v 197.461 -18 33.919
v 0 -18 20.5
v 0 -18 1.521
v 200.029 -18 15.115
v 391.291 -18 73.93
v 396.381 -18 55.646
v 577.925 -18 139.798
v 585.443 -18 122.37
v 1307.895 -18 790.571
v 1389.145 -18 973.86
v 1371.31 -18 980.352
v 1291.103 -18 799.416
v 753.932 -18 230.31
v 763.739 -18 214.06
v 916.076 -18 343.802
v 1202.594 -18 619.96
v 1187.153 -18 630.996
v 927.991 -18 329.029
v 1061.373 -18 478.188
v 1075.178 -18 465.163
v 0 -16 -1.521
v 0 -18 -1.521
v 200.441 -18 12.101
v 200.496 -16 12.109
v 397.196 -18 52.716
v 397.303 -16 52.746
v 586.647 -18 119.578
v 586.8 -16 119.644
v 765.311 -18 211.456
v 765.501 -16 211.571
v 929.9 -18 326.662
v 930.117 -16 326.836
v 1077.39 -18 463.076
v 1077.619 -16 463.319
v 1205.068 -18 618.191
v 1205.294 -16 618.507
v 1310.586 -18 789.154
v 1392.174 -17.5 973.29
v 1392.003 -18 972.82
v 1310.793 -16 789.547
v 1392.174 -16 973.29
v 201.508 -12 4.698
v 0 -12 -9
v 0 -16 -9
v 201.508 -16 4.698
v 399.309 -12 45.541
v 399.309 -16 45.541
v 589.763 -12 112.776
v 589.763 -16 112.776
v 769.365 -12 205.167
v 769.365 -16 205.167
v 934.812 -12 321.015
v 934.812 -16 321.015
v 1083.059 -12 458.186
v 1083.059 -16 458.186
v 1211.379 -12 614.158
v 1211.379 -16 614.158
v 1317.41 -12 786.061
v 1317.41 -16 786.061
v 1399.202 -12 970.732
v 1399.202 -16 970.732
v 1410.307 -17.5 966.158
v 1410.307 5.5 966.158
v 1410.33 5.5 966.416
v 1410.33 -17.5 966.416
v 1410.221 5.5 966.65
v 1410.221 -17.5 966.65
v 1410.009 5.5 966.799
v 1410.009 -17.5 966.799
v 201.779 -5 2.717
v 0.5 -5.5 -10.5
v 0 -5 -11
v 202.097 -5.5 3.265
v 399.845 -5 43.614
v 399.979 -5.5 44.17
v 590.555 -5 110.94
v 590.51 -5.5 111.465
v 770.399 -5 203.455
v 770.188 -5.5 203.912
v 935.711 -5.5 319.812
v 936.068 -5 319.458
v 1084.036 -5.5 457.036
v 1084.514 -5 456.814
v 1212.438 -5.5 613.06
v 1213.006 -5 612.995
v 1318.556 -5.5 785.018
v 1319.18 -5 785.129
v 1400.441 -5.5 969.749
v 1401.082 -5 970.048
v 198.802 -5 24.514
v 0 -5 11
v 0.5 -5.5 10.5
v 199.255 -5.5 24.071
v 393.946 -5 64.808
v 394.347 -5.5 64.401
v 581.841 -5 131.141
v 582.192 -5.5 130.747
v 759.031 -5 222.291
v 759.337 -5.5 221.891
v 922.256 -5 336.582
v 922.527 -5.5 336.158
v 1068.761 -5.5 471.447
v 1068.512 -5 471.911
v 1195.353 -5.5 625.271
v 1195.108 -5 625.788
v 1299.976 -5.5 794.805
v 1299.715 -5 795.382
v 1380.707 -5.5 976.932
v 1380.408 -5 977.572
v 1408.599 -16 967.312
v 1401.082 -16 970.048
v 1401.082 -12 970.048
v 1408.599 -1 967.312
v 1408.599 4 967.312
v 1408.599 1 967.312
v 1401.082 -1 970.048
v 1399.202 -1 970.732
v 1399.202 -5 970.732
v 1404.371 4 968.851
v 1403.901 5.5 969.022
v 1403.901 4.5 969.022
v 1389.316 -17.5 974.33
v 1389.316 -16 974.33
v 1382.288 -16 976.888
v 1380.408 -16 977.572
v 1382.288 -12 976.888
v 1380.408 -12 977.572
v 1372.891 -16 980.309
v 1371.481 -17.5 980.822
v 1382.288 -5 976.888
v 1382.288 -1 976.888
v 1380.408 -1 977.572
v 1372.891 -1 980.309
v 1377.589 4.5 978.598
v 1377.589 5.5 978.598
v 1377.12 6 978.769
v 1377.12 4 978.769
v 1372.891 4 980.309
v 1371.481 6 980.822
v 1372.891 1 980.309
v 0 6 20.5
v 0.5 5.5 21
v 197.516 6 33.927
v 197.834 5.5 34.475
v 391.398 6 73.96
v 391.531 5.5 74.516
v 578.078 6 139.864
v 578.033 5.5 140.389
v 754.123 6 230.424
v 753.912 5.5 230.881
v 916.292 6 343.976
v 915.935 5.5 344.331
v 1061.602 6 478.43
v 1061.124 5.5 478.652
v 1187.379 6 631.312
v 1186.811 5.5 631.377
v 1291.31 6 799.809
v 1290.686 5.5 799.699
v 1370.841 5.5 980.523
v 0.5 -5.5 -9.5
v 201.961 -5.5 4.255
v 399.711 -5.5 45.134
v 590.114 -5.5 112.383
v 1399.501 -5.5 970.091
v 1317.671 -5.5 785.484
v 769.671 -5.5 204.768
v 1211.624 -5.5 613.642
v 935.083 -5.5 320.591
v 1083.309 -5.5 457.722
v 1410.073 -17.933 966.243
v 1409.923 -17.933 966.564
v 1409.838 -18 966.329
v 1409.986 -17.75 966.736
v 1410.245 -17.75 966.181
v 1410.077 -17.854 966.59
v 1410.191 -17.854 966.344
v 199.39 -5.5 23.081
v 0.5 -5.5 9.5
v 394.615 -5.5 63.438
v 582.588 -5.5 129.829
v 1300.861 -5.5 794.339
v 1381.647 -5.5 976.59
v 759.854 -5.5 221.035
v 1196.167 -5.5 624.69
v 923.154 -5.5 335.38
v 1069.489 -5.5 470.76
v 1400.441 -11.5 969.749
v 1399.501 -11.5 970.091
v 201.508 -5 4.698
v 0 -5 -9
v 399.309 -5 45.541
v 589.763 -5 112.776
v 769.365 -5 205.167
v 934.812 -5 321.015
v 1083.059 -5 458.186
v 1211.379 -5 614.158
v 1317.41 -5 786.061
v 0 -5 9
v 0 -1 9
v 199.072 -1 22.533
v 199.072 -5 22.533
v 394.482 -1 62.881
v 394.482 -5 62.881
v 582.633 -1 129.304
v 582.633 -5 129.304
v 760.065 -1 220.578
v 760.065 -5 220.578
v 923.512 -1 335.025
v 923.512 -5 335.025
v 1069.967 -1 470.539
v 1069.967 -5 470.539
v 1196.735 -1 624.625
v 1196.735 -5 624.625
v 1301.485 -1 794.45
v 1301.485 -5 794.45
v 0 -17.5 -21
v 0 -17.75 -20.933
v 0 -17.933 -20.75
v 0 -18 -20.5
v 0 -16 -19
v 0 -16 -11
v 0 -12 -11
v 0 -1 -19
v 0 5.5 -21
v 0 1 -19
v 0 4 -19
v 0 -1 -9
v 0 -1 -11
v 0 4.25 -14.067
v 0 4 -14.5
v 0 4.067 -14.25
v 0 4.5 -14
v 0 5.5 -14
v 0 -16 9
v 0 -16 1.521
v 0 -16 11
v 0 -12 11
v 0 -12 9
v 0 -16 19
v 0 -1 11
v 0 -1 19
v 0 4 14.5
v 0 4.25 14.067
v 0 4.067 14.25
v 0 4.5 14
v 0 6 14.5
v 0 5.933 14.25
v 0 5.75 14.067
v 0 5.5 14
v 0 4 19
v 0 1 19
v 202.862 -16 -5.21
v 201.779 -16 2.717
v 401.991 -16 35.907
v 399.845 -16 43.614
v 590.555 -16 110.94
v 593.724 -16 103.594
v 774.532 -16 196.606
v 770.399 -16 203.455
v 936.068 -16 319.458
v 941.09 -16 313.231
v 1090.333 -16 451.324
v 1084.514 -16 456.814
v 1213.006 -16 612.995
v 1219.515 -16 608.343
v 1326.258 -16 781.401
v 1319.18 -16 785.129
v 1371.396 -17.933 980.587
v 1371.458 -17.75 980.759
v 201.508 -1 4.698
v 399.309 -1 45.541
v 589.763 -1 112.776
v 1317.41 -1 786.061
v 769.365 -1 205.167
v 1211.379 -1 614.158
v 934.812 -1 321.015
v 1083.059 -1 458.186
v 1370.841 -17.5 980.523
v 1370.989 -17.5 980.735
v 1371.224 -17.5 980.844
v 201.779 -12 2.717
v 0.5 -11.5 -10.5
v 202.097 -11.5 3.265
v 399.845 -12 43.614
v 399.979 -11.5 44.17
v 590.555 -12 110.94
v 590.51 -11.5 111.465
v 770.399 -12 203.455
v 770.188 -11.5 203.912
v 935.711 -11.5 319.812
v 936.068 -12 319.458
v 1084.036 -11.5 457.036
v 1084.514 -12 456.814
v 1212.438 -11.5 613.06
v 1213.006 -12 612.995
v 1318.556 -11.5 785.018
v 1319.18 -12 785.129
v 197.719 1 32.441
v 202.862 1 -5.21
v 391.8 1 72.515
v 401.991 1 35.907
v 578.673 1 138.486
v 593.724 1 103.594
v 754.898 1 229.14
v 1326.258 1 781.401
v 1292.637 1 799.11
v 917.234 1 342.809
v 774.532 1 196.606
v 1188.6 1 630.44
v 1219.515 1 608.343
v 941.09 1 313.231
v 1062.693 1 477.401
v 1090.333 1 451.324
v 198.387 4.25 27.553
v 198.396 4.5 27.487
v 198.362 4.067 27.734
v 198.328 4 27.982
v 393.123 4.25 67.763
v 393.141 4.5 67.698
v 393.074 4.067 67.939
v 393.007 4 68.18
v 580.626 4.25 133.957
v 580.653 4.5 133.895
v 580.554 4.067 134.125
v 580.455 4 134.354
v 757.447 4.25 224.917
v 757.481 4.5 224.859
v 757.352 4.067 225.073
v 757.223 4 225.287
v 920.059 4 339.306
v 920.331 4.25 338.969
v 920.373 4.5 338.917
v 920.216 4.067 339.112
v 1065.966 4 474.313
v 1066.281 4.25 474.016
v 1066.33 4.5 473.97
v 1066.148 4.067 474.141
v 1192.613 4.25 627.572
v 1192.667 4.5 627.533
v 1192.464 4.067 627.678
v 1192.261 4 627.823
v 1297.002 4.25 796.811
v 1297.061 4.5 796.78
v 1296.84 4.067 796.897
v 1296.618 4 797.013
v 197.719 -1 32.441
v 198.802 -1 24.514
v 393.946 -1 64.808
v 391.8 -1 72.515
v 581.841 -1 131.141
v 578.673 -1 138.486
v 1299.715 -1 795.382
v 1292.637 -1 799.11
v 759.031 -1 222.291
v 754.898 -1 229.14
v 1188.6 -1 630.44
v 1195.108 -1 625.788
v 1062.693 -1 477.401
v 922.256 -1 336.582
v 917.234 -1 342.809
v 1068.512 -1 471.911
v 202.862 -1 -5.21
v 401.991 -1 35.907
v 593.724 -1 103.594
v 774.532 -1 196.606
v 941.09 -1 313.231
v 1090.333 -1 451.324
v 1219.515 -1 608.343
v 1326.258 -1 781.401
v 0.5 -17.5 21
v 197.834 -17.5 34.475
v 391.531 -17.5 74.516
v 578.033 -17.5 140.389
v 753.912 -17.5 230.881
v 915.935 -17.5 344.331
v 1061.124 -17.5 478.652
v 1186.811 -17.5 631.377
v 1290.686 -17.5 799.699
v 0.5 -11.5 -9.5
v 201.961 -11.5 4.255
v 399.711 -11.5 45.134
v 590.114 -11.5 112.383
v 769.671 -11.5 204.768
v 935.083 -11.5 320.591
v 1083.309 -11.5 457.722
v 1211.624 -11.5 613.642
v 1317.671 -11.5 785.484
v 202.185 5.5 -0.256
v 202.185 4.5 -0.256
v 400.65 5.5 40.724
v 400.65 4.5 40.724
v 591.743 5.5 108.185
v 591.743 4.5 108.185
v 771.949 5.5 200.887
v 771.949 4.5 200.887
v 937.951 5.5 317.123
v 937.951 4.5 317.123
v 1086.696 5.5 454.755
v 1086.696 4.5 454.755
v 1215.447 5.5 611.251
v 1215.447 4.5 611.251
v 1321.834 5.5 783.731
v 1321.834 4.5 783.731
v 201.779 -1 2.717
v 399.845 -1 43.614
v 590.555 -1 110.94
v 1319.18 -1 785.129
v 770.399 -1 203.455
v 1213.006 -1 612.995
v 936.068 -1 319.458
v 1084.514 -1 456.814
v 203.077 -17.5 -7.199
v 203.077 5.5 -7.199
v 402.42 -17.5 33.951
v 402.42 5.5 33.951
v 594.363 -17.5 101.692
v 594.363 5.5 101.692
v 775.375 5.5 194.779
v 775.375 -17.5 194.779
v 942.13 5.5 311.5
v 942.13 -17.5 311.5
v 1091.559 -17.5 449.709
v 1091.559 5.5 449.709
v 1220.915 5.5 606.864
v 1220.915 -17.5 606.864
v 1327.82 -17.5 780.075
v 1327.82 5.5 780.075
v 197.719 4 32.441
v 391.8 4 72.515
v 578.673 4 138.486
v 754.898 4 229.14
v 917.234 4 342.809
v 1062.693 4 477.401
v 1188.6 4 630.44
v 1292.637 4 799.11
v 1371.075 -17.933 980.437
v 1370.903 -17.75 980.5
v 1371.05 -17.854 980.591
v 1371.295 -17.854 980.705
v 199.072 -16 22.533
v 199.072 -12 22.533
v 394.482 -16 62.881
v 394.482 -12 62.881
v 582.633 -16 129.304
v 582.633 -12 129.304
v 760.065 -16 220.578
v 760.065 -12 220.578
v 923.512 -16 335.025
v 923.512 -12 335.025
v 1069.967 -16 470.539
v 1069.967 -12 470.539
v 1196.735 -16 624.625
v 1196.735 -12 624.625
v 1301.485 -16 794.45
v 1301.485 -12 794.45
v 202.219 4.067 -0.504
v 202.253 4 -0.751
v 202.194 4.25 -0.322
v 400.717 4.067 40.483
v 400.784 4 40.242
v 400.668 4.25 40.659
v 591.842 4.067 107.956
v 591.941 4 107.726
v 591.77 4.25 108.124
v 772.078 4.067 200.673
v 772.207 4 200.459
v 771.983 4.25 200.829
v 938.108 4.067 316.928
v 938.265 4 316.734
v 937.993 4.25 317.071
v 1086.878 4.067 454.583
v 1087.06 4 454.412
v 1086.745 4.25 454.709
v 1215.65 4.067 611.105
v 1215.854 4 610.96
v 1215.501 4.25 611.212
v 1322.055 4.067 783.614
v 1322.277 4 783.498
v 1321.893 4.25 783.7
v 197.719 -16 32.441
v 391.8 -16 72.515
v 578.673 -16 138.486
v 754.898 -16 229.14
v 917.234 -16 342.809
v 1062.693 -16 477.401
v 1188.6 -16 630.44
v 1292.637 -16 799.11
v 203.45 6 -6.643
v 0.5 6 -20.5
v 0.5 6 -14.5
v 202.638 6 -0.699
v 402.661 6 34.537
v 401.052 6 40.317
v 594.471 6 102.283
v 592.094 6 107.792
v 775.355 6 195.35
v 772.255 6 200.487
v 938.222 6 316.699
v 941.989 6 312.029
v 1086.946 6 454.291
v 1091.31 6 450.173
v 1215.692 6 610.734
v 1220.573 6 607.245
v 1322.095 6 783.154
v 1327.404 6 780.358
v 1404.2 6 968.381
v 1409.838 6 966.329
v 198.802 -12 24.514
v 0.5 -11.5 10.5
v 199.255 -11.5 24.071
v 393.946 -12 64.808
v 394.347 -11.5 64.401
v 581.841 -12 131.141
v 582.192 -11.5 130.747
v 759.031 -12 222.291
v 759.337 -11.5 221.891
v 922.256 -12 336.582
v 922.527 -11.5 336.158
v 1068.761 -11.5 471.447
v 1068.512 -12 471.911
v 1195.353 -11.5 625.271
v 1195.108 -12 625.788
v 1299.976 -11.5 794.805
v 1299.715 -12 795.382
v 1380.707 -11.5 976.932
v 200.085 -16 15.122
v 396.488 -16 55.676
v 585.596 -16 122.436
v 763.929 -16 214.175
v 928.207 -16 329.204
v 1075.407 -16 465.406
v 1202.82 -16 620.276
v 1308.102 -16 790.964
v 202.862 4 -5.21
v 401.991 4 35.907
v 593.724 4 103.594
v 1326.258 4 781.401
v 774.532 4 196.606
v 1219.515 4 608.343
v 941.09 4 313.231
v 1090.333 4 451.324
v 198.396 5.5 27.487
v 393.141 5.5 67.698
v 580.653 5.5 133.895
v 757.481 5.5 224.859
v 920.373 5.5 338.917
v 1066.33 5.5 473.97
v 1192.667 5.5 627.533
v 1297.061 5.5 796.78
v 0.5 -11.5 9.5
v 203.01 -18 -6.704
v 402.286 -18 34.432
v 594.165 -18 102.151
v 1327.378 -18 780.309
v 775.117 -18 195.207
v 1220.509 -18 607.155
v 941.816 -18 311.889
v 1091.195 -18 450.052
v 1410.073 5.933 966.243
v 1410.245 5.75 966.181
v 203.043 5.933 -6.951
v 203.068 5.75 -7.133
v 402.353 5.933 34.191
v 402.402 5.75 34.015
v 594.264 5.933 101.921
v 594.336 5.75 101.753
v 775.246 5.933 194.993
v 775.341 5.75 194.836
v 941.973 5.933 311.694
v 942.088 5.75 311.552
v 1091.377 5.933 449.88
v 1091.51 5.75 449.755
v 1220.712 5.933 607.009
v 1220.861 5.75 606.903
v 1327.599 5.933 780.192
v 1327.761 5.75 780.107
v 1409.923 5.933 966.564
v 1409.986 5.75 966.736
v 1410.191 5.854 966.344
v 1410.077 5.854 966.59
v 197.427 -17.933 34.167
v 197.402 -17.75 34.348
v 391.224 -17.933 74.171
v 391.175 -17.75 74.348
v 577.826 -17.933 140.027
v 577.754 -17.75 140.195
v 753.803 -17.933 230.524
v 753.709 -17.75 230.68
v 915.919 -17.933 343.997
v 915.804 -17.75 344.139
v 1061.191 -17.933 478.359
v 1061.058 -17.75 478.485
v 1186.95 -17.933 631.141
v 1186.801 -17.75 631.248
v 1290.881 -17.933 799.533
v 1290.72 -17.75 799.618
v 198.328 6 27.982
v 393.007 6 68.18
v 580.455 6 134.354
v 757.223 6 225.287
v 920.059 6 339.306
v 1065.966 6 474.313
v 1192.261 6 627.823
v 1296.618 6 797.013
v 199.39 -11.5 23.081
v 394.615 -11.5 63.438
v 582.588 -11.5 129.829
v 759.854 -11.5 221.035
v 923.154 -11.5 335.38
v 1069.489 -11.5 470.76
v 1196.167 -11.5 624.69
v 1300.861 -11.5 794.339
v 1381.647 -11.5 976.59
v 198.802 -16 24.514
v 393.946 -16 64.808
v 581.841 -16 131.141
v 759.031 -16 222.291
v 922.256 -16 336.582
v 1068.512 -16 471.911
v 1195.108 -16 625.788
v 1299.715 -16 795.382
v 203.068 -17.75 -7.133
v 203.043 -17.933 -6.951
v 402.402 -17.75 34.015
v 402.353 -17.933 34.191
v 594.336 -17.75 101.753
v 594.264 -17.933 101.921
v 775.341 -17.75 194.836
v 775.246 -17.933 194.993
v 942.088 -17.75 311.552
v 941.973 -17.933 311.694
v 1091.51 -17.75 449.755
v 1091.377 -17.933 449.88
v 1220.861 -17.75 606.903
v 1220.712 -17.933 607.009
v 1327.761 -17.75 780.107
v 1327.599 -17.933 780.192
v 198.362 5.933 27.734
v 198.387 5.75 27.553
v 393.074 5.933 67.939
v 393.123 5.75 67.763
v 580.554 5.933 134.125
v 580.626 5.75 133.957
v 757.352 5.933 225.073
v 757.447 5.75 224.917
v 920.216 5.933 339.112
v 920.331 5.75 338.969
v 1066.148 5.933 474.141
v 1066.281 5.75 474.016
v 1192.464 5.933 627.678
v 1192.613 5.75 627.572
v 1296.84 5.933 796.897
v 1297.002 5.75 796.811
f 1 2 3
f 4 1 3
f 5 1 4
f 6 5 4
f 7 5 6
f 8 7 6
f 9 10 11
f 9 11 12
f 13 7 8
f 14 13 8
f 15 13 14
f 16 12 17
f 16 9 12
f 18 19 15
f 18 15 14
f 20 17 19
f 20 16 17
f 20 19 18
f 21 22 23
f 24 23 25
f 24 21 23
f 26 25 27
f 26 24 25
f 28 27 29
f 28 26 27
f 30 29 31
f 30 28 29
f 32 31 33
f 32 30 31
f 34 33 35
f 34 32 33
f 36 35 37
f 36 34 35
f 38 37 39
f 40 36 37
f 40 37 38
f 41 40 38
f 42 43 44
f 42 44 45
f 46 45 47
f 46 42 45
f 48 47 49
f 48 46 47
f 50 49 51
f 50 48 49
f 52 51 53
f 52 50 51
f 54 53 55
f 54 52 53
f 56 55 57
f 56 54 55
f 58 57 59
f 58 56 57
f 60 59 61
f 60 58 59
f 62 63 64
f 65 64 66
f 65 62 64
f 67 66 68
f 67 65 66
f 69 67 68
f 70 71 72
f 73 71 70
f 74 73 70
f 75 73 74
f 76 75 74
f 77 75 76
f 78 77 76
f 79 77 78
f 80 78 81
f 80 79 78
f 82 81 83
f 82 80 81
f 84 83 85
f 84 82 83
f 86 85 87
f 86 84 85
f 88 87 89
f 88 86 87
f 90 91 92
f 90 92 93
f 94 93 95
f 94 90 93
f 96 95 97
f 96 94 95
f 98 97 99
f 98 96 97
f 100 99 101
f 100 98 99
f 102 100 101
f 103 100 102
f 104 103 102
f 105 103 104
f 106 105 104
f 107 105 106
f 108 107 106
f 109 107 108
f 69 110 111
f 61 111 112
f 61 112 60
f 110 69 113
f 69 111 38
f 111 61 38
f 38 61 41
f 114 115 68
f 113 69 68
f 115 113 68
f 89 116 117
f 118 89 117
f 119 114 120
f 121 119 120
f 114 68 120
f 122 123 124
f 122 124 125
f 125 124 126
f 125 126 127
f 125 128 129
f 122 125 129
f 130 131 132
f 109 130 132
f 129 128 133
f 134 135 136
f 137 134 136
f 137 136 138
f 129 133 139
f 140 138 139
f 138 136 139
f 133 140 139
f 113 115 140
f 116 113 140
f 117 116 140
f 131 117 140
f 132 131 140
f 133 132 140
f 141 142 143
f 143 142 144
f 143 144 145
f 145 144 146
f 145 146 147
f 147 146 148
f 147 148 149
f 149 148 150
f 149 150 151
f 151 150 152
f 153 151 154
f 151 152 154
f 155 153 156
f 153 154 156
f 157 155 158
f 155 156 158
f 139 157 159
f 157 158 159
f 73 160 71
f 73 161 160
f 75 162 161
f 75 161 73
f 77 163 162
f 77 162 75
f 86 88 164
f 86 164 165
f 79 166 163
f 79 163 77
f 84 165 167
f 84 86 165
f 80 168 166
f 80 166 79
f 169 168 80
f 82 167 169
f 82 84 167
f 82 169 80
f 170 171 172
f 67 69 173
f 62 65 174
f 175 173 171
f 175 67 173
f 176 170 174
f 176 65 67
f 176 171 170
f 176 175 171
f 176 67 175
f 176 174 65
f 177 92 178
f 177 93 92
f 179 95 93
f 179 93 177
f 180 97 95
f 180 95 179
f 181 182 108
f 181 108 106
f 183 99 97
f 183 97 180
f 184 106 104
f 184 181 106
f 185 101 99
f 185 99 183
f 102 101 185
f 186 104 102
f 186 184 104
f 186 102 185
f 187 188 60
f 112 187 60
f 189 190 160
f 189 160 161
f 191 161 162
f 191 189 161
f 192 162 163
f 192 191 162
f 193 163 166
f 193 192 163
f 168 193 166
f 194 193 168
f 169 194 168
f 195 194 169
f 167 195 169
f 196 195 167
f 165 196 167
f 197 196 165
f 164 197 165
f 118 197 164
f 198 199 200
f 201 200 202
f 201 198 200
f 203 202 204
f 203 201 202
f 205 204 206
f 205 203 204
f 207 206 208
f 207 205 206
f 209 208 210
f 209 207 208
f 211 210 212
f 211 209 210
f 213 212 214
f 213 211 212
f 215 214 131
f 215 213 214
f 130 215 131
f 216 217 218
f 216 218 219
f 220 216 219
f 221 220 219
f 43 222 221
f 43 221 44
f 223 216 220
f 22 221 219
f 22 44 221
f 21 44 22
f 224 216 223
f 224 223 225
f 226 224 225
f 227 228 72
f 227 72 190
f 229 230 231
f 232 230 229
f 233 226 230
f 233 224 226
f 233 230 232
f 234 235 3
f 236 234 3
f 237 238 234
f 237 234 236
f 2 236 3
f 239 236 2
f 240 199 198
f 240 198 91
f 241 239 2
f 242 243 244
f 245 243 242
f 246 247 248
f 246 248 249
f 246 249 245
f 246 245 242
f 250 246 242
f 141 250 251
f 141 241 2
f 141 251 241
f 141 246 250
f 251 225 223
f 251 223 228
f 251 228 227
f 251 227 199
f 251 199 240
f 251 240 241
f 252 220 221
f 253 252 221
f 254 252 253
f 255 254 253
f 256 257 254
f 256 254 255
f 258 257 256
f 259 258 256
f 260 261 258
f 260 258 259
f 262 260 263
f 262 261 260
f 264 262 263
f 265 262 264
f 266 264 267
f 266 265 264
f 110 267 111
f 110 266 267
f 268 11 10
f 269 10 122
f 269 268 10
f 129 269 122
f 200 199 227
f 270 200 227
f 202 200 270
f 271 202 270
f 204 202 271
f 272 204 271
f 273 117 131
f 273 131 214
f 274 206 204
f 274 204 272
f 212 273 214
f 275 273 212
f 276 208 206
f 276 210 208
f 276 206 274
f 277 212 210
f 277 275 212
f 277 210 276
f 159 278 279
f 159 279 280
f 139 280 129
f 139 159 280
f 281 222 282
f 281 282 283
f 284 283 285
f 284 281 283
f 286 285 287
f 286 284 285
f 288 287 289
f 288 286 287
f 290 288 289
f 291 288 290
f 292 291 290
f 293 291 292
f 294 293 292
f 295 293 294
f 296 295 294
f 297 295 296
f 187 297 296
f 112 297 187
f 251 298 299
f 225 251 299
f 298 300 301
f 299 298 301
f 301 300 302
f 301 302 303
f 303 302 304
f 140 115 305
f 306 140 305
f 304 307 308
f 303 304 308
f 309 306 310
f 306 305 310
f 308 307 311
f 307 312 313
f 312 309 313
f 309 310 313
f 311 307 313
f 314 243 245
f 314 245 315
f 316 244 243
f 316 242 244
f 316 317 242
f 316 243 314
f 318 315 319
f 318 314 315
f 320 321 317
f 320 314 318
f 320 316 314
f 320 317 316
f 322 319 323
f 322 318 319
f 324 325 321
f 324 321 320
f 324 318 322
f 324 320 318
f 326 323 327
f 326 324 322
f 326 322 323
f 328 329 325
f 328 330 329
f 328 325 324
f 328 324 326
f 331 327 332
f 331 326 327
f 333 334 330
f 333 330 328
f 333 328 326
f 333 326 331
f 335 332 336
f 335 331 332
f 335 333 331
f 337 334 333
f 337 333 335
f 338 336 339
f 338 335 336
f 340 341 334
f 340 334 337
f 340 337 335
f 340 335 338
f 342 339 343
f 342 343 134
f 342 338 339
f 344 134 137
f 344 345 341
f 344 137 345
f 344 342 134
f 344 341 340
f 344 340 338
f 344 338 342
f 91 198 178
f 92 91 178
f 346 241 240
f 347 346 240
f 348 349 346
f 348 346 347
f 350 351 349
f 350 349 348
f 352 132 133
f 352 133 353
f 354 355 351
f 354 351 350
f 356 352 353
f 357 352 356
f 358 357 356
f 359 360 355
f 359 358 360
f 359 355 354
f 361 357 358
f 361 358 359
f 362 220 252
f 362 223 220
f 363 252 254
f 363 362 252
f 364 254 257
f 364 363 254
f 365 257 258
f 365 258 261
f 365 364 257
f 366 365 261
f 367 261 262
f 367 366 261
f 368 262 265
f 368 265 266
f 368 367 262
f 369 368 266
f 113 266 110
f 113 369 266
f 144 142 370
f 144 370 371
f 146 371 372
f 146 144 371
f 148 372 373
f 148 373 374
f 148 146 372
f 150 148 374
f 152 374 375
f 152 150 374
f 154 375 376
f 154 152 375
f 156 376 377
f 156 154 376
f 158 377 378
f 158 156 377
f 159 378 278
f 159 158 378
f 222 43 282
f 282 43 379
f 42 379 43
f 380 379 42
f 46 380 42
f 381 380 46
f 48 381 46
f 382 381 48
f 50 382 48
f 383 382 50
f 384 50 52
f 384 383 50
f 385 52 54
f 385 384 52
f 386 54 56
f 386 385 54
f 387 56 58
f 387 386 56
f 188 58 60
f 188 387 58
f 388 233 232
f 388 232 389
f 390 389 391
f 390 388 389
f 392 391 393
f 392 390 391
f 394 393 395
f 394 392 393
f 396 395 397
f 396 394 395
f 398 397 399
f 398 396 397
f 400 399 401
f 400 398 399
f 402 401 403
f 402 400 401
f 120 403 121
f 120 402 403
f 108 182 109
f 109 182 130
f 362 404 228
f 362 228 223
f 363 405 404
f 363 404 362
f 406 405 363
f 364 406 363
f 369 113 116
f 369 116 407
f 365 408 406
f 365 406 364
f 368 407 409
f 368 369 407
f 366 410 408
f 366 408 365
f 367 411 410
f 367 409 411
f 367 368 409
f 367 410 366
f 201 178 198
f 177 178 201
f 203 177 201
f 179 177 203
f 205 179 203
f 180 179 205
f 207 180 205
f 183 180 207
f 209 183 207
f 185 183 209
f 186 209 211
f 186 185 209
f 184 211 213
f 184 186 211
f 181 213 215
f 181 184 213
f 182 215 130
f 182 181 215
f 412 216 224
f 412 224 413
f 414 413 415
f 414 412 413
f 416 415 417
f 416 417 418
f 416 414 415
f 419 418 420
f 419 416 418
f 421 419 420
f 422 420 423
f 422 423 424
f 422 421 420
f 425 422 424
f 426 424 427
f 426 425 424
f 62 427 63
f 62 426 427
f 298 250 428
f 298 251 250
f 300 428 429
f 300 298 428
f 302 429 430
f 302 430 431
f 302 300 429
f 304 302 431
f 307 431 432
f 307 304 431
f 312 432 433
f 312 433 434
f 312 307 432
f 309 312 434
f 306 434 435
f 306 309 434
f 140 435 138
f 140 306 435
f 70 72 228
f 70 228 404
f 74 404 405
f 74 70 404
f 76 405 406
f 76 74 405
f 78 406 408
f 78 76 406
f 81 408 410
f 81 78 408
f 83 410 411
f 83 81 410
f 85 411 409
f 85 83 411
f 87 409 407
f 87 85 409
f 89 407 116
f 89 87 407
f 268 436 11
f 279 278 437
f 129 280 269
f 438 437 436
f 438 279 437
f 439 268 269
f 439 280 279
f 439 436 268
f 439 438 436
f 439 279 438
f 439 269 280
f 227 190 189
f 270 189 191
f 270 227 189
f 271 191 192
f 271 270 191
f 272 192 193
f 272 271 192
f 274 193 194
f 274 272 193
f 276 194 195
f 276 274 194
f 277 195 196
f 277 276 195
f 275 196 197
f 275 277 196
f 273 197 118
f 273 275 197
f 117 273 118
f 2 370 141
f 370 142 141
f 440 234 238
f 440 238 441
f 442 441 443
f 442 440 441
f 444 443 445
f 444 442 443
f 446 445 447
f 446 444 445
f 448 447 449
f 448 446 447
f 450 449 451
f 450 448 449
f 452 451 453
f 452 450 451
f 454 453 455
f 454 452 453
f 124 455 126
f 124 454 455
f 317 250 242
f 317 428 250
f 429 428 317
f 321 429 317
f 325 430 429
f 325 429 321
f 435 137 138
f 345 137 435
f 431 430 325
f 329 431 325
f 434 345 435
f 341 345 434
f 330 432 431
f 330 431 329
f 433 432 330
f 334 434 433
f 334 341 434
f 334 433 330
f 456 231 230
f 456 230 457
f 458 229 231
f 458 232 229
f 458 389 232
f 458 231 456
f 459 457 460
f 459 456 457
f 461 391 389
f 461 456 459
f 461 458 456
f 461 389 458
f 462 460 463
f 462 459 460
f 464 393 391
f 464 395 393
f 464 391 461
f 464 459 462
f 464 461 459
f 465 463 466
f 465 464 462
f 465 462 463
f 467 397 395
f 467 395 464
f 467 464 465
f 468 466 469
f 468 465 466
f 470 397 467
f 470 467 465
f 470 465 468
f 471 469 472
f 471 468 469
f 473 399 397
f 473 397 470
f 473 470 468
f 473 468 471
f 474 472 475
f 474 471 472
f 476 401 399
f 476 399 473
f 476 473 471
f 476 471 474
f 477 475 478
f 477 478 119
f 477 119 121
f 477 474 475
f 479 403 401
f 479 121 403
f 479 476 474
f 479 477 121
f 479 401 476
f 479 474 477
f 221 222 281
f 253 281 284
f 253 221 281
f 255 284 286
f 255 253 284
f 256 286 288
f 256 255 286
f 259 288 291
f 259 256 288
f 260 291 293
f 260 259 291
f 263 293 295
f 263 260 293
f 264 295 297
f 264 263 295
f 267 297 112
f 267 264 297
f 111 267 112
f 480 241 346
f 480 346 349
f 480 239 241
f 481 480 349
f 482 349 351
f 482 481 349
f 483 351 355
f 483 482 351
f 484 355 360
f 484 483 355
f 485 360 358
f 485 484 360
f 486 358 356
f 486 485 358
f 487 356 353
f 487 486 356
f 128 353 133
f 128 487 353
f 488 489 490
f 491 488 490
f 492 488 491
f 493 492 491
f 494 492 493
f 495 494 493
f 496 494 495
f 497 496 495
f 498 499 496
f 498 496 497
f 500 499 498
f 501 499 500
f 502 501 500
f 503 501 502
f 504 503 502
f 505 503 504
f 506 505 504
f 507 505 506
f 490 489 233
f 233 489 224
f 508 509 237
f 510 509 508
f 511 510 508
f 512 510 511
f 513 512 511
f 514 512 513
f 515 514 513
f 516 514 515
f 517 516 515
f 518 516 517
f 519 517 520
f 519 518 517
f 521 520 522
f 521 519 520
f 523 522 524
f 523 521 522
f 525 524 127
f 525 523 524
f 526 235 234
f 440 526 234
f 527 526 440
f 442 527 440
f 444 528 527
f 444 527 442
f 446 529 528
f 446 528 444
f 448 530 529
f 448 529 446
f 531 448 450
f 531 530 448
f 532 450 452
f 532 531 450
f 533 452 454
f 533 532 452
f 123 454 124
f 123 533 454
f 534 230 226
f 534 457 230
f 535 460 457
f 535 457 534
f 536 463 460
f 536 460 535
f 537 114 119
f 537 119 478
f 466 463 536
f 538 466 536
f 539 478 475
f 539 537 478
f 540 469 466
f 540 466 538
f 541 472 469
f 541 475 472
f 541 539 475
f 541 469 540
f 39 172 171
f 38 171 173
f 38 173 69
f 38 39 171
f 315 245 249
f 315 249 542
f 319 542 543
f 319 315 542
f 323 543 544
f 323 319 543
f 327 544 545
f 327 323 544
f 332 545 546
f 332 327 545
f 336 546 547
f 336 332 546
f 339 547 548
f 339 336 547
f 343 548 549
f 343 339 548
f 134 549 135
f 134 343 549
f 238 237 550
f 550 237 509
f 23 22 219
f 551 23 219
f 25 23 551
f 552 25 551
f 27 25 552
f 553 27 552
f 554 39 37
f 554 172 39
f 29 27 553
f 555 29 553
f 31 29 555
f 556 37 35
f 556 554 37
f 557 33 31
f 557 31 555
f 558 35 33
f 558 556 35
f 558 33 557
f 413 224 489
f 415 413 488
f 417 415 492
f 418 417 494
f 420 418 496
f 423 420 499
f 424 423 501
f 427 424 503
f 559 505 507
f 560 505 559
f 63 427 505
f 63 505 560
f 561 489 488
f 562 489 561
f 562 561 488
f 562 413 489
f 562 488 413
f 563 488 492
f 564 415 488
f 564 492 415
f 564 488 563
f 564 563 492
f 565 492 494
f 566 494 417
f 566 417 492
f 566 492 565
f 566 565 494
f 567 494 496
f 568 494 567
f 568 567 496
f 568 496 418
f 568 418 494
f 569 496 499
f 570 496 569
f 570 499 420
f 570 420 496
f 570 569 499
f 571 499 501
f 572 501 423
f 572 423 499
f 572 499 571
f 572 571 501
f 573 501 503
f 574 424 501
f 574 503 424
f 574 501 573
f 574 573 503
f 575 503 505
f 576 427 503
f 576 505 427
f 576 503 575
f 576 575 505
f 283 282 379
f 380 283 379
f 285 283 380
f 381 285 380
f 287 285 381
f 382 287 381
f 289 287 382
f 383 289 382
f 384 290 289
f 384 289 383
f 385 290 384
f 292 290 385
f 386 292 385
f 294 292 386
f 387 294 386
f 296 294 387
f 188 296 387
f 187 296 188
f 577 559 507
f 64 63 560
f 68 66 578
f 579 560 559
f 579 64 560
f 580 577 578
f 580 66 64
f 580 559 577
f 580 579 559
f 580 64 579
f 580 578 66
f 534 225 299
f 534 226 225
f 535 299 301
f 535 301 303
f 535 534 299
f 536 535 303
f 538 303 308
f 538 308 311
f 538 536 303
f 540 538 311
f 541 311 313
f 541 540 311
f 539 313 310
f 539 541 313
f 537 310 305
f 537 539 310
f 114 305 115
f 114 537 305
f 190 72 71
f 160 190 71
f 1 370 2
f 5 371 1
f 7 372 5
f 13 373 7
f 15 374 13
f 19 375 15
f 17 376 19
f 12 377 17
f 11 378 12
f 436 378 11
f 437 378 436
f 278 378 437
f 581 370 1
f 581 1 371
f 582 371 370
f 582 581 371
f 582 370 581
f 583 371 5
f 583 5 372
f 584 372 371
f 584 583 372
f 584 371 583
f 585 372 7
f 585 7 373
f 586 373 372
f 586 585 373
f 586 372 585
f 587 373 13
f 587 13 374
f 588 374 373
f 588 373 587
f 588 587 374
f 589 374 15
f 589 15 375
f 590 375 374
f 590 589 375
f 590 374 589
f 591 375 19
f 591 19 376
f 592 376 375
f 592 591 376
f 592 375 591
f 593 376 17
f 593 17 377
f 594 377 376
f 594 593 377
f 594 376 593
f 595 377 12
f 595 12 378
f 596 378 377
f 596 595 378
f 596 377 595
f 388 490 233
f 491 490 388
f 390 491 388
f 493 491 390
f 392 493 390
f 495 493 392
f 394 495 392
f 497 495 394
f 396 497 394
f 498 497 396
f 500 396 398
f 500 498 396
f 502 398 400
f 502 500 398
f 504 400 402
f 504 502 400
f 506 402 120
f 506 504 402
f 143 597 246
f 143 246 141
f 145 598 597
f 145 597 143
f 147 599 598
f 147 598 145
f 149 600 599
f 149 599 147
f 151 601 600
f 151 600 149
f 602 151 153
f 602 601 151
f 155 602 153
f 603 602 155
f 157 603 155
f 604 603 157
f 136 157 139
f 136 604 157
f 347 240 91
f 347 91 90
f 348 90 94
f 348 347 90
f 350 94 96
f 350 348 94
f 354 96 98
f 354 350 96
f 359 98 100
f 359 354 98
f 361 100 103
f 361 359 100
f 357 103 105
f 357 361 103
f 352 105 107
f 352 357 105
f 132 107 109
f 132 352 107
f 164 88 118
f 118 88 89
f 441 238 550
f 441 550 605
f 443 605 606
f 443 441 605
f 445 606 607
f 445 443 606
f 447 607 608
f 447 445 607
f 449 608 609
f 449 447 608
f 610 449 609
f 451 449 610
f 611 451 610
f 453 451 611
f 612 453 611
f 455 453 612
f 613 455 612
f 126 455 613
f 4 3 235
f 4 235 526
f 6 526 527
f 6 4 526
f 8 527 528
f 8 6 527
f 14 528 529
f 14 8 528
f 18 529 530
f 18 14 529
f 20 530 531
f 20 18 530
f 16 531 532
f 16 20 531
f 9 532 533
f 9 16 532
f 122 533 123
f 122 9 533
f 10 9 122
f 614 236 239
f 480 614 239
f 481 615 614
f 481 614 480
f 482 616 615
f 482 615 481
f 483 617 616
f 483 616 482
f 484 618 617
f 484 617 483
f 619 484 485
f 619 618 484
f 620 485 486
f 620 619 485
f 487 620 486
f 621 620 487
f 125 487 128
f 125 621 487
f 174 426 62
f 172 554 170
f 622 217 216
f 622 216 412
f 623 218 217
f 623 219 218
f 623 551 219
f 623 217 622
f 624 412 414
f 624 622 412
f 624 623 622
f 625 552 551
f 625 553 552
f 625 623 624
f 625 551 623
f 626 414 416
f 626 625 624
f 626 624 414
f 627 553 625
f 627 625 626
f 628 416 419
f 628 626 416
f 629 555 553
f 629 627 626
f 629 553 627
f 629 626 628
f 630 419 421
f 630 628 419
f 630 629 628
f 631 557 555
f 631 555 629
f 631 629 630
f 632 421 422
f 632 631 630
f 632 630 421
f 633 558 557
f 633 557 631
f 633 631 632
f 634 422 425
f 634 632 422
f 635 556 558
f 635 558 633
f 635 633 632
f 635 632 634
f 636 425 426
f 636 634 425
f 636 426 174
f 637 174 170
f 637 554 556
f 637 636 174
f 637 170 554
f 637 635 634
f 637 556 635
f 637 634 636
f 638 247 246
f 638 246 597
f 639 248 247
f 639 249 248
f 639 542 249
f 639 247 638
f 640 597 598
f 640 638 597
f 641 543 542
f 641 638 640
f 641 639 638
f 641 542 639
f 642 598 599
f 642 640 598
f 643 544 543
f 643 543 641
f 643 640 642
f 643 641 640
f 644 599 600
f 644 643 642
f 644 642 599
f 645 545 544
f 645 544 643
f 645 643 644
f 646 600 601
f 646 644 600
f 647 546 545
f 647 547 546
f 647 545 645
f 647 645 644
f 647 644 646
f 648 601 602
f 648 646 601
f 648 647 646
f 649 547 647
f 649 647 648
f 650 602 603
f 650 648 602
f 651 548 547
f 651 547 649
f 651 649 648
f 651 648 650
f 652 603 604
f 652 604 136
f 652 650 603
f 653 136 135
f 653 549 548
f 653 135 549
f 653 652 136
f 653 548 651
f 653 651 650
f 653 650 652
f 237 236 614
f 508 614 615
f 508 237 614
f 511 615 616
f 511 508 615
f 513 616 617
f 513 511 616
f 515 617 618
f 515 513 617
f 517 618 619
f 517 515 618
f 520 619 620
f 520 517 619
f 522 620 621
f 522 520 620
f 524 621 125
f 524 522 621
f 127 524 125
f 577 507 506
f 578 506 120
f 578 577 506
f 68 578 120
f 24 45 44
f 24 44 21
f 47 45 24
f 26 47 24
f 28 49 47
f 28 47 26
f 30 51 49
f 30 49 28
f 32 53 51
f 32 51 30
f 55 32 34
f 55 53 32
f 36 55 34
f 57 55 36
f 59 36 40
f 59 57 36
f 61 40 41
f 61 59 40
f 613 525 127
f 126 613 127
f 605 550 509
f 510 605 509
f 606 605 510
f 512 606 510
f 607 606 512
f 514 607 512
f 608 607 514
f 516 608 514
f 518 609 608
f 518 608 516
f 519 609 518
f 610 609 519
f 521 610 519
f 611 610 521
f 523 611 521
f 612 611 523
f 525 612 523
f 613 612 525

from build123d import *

# Parameters (mm, degrees)
REVOLVE_1_ANGLE = 70
FILLET_1_R      = 0.5
FILLET_2_R      = 0.5


with BuildPart() as part:
    # 草图1 → 旋转1 (revolve)
    with BuildSketch(Plane(origin=(0, 0, 0), x_dir=(0, 0, -1), z_dir=(1, 0, 0))):
        Polygon((-21, 6), (-14, 6), (-14, 4), (-19, 4), (-19, 1), (-0.046652987, 1), (0.046652987, 1), (19, 1), (19, 4), (14, 4), (14, 6), (21, 6), (21, -18), (1.520680953, -18), (1.520680953, -16), (9, -16), (9, -11.5), (11, -11.5), (11, -16), (19, -16), (19, -1), (11, -1), (11, -5.5), (9, -5.5), (9, -1), (-9, -1), (-9, -5.5), (-11, -5.5), (-11, -1), (-19, -1), (-19, -16), (-11, -16), (-11, -11.5), (-9, -11.5), (-9, -16), (-1.520680953, -16), (-1.520680953, -18), (-21, -18), align=None)
    revolve(axis=Axis((0, 82.1191999, 1480), (0, -1, 0)), revolution_arc=REVOLVE_1_ANGLE)

    # 圆角1
    fillet_1_edges = [part.edges().sort_by_distance(p)[0] for p in [
        (0, 6, -17.5),
        (860.938230963, 6, 250.452781522),
        (1407.189699627, 6, 967.82483537),
        (856.923195908, 6, 256.186845832),
        (0, -6, 21),
        (836.848020636, 6, 284.857167382),
        (1371.011533727, -6, 980.992610888),
        (836.848020636, -18, 284.857167382),
        (856.923195908, 4, 256.186845832),
        (860.938230963, -18, 250.452781522),
        (1410.4786238, -6, 966.627764868),
        (1401.326337616, -18, 969.958924614),
        (1380.16381991, -18, 977.661451142),
        (840.863055691, 4, 279.123103072),
        (840.863055691, 6, 279.123103072),
    ]]
    fillet(fillet_1_edges, radius=FILLET_1_R)

    # 圆角2
    # the kernel refuses this fillet: 0.5 mm, written as the material it takes off along each edge
    with BuildSketch(Plane(origin=(1379.233844159, -11.5, 977.999934634), x_dir=(0, -1, 0), z_dir=(0.9396926207859094, 0, -0.34202014332566616)), Plane(origin=(1383.462460952, -5.5, 976.460843989), x_dir=(0, 1, 0), z_dir=(-0.9396926207859094, 0, 0.34202014332566616)), Plane(origin=(1402.256313368, -5.5, 969.620441122), x_dir=(0, 1, 0), z_dir=(-0.9396926207859094, 0, 0.34202014332566616)), Plane(origin=(1398.027696574, -11.5, 971.159531767), x_dir=(0, -1, 0), z_dir=(0.9396926207859094, 0, -0.34202014332566616))) as fillet_2_piece_1:
        with BuildLine():
            CenterArc((FILLET_2_R, FILLET_2_R), FILLET_2_R, 180, 90)
            Line((0, FILLET_2_R), (0, 0))
            Line((0, 0), (FILLET_2_R, 0))
        make_face()
    extrude(amount=4.5, mode=Mode.SUBTRACT)
    with BuildSketch(Plane(origin=(0, -11.5, 12.25), x_dir=(0, -1, 0), z_dir=(0, 0, -1)), Plane(origin=(0, -5.5, 7.75), x_dir=(0, 1, 0), z_dir=(0, 0, 1)), Plane(origin=(0, -5.5, -12.25), x_dir=(0, 1, 0), z_dir=(0, 0, 1)), Plane(origin=(0, -11.5, -7.75), x_dir=(0, -1, 0), z_dir=(0, 0, -1))) as fillet_2_piece_2:
        with BuildLine():
            CenterArc((FILLET_2_R, -FILLET_2_R), FILLET_2_R, 90, 90)
            Line((0, -FILLET_2_R), (0, 0))
            Line((0, 0), (FILLET_2_R, 0))
        make_face()
    extrude(amount=4.5, mode=Mode.SUBTRACT)
    with BuildSketch(Plane(origin=(0, -11.5, 1480), x_dir=(-0.0008396934722152373, 0, -0.9999996474573741), z_dir=(-0.9999996474573741, 0, 0.0008396934722152373))) as fillet_2_piece_3:
        with BuildLine():
            CenterArc((1489 + FILLET_2_R, FILLET_2_R), FILLET_2_R, 180, 90)
            Line((1489 + FILLET_2_R, 0), (1489, 0))
            Line((1489, 0), (1489, FILLET_2_R))
        make_face()
    revolve(axis=Axis((0, -11.5, 1480), (0, -1, 0)), revolution_arc=70.096221795, mode=Mode.SUBTRACT)
    with BuildSketch(Plane(origin=(0, -11.5, 1480), x_dir=(-0.0008385671230867866, 0, -0.9999996484025282), z_dir=(-0.9999996484025282, 0, 0.0008385671230867866))) as fillet_2_piece_4:
        with BuildLine():
            CenterArc((1491 - FILLET_2_R, FILLET_2_R), FILLET_2_R, 270, 90)
            Line((1491, FILLET_2_R), (1491, 0))
            Line((1491, 0), (1491 - FILLET_2_R, 0))
        make_face()
    revolve(axis=Axis((0, -11.5, 1480), (0, -1, 0)), revolution_arc=70.096092725, mode=Mode.SUBTRACT)
    with BuildSketch(Plane(origin=(0, -5.5, 1480), x_dir=(-0.0008385671230867866, 0, -0.9999996484025282), z_dir=(-0.9999996484025282, 0, 0.0008385671230867866))) as fillet_2_piece_5:
        with BuildLine():
            CenterArc((1491 - FILLET_2_R, -FILLET_2_R), FILLET_2_R, 0, 90)
            Line((1491, -FILLET_2_R), (1491, 0))
            Line((1491, 0), (1491 - FILLET_2_R, 0))
        make_face()
    revolve(axis=Axis((0, -5.5, 1480), (0, -1, 0)), revolution_arc=70.096092725, mode=Mode.SUBTRACT)
    with BuildSketch(Plane(origin=(0, -5.5, 1480), x_dir=(-0.0008396934722152373, 0, -0.9999996474573741), z_dir=(-0.9999996474573741, 0, 0.0008396934722152373))) as fillet_2_piece_6:
        with BuildLine():
            CenterArc((1489 + FILLET_2_R, -FILLET_2_R), FILLET_2_R, 90, 90)
            Line((1489 + FILLET_2_R, 0), (1489, 0))
            Line((1489, 0), (1489, -FILLET_2_R))
        make_face()
    revolve(axis=Axis((0, -5.5, 1480), (0, -1, 0)), revolution_arc=70.096221795, mode=Mode.SUBTRACT)
    with BuildSketch(Plane(origin=(0, -5.5, 1480), x_dir=(-0.0008499684408638254, 0, -0.9999996387767596), z_dir=(-0.9999996387767596, 0, 0.0008499684408638254))) as fillet_2_piece_7:
        with BuildLine():
            CenterArc((1471 - FILLET_2_R, -FILLET_2_R), FILLET_2_R, 0, 90)
            Line((1471, -FILLET_2_R), (1471, 0))
            Line((1471, 0), (1471 - FILLET_2_R, 0))
        make_face()
    revolve(axis=Axis((0, -5.5, 1480), (0, -1, 0)), revolution_arc=70.09739922, mode=Mode.SUBTRACT)
    with BuildSketch(Plane(origin=(0, -5.5, 1480), x_dir=(-0.0008511256474475692, 0, -0.9999996377925005), z_dir=(-0.9999996377925005, 0, 0.0008511256474475692))) as fillet_2_piece_8:
        with BuildLine():
            CenterArc((1469 + FILLET_2_R, -FILLET_2_R), FILLET_2_R, 90, 90)
            Line((1469 + FILLET_2_R, 0), (1469, 0))
            Line((1469, 0), (1469, -FILLET_2_R))
        make_face()
    revolve(axis=Axis((0, -5.5, 1480), (0, -1, 0)), revolution_arc=70.097531827, mode=Mode.SUBTRACT)
    with BuildSketch(Plane(origin=(0, -11.5, 1480), x_dir=(-0.0008511256474475692, 0, -0.9999996377925005), z_dir=(-0.9999996377925005, 0, 0.0008511256474475692))) as fillet_2_piece_9:
        with BuildLine():
            CenterArc((1469 + FILLET_2_R, FILLET_2_R), FILLET_2_R, 180, 90)
            Line((1469, FILLET_2_R), (1469, 0))
            Line((1469, 0), (1469 + FILLET_2_R, 0))
        make_face()
    revolve(axis=Axis((0, -11.5, 1480), (0, -1, 0)), revolution_arc=70.097531827, mode=Mode.SUBTRACT)
    with BuildSketch(Plane(origin=(0, -11.5, 1480), x_dir=(-0.0008499684408638254, 0, -0.9999996387767596), z_dir=(-0.9999996387767596, 0, 0.0008499684408638254))) as fillet_2_piece_10:
        with BuildLine():
            CenterArc((1471 - FILLET_2_R, FILLET_2_R), FILLET_2_R, 270, 90)
            Line((1471 - FILLET_2_R, 0), (1471, 0))
            Line((1471, 0), (1471, FILLET_2_R))
        make_face()
    revolve(axis=Axis((0, -11.5, 1480), (0, -1, 0)), revolution_arc=70.09739922, mode=Mode.SUBTRACT)


solid = part.part
